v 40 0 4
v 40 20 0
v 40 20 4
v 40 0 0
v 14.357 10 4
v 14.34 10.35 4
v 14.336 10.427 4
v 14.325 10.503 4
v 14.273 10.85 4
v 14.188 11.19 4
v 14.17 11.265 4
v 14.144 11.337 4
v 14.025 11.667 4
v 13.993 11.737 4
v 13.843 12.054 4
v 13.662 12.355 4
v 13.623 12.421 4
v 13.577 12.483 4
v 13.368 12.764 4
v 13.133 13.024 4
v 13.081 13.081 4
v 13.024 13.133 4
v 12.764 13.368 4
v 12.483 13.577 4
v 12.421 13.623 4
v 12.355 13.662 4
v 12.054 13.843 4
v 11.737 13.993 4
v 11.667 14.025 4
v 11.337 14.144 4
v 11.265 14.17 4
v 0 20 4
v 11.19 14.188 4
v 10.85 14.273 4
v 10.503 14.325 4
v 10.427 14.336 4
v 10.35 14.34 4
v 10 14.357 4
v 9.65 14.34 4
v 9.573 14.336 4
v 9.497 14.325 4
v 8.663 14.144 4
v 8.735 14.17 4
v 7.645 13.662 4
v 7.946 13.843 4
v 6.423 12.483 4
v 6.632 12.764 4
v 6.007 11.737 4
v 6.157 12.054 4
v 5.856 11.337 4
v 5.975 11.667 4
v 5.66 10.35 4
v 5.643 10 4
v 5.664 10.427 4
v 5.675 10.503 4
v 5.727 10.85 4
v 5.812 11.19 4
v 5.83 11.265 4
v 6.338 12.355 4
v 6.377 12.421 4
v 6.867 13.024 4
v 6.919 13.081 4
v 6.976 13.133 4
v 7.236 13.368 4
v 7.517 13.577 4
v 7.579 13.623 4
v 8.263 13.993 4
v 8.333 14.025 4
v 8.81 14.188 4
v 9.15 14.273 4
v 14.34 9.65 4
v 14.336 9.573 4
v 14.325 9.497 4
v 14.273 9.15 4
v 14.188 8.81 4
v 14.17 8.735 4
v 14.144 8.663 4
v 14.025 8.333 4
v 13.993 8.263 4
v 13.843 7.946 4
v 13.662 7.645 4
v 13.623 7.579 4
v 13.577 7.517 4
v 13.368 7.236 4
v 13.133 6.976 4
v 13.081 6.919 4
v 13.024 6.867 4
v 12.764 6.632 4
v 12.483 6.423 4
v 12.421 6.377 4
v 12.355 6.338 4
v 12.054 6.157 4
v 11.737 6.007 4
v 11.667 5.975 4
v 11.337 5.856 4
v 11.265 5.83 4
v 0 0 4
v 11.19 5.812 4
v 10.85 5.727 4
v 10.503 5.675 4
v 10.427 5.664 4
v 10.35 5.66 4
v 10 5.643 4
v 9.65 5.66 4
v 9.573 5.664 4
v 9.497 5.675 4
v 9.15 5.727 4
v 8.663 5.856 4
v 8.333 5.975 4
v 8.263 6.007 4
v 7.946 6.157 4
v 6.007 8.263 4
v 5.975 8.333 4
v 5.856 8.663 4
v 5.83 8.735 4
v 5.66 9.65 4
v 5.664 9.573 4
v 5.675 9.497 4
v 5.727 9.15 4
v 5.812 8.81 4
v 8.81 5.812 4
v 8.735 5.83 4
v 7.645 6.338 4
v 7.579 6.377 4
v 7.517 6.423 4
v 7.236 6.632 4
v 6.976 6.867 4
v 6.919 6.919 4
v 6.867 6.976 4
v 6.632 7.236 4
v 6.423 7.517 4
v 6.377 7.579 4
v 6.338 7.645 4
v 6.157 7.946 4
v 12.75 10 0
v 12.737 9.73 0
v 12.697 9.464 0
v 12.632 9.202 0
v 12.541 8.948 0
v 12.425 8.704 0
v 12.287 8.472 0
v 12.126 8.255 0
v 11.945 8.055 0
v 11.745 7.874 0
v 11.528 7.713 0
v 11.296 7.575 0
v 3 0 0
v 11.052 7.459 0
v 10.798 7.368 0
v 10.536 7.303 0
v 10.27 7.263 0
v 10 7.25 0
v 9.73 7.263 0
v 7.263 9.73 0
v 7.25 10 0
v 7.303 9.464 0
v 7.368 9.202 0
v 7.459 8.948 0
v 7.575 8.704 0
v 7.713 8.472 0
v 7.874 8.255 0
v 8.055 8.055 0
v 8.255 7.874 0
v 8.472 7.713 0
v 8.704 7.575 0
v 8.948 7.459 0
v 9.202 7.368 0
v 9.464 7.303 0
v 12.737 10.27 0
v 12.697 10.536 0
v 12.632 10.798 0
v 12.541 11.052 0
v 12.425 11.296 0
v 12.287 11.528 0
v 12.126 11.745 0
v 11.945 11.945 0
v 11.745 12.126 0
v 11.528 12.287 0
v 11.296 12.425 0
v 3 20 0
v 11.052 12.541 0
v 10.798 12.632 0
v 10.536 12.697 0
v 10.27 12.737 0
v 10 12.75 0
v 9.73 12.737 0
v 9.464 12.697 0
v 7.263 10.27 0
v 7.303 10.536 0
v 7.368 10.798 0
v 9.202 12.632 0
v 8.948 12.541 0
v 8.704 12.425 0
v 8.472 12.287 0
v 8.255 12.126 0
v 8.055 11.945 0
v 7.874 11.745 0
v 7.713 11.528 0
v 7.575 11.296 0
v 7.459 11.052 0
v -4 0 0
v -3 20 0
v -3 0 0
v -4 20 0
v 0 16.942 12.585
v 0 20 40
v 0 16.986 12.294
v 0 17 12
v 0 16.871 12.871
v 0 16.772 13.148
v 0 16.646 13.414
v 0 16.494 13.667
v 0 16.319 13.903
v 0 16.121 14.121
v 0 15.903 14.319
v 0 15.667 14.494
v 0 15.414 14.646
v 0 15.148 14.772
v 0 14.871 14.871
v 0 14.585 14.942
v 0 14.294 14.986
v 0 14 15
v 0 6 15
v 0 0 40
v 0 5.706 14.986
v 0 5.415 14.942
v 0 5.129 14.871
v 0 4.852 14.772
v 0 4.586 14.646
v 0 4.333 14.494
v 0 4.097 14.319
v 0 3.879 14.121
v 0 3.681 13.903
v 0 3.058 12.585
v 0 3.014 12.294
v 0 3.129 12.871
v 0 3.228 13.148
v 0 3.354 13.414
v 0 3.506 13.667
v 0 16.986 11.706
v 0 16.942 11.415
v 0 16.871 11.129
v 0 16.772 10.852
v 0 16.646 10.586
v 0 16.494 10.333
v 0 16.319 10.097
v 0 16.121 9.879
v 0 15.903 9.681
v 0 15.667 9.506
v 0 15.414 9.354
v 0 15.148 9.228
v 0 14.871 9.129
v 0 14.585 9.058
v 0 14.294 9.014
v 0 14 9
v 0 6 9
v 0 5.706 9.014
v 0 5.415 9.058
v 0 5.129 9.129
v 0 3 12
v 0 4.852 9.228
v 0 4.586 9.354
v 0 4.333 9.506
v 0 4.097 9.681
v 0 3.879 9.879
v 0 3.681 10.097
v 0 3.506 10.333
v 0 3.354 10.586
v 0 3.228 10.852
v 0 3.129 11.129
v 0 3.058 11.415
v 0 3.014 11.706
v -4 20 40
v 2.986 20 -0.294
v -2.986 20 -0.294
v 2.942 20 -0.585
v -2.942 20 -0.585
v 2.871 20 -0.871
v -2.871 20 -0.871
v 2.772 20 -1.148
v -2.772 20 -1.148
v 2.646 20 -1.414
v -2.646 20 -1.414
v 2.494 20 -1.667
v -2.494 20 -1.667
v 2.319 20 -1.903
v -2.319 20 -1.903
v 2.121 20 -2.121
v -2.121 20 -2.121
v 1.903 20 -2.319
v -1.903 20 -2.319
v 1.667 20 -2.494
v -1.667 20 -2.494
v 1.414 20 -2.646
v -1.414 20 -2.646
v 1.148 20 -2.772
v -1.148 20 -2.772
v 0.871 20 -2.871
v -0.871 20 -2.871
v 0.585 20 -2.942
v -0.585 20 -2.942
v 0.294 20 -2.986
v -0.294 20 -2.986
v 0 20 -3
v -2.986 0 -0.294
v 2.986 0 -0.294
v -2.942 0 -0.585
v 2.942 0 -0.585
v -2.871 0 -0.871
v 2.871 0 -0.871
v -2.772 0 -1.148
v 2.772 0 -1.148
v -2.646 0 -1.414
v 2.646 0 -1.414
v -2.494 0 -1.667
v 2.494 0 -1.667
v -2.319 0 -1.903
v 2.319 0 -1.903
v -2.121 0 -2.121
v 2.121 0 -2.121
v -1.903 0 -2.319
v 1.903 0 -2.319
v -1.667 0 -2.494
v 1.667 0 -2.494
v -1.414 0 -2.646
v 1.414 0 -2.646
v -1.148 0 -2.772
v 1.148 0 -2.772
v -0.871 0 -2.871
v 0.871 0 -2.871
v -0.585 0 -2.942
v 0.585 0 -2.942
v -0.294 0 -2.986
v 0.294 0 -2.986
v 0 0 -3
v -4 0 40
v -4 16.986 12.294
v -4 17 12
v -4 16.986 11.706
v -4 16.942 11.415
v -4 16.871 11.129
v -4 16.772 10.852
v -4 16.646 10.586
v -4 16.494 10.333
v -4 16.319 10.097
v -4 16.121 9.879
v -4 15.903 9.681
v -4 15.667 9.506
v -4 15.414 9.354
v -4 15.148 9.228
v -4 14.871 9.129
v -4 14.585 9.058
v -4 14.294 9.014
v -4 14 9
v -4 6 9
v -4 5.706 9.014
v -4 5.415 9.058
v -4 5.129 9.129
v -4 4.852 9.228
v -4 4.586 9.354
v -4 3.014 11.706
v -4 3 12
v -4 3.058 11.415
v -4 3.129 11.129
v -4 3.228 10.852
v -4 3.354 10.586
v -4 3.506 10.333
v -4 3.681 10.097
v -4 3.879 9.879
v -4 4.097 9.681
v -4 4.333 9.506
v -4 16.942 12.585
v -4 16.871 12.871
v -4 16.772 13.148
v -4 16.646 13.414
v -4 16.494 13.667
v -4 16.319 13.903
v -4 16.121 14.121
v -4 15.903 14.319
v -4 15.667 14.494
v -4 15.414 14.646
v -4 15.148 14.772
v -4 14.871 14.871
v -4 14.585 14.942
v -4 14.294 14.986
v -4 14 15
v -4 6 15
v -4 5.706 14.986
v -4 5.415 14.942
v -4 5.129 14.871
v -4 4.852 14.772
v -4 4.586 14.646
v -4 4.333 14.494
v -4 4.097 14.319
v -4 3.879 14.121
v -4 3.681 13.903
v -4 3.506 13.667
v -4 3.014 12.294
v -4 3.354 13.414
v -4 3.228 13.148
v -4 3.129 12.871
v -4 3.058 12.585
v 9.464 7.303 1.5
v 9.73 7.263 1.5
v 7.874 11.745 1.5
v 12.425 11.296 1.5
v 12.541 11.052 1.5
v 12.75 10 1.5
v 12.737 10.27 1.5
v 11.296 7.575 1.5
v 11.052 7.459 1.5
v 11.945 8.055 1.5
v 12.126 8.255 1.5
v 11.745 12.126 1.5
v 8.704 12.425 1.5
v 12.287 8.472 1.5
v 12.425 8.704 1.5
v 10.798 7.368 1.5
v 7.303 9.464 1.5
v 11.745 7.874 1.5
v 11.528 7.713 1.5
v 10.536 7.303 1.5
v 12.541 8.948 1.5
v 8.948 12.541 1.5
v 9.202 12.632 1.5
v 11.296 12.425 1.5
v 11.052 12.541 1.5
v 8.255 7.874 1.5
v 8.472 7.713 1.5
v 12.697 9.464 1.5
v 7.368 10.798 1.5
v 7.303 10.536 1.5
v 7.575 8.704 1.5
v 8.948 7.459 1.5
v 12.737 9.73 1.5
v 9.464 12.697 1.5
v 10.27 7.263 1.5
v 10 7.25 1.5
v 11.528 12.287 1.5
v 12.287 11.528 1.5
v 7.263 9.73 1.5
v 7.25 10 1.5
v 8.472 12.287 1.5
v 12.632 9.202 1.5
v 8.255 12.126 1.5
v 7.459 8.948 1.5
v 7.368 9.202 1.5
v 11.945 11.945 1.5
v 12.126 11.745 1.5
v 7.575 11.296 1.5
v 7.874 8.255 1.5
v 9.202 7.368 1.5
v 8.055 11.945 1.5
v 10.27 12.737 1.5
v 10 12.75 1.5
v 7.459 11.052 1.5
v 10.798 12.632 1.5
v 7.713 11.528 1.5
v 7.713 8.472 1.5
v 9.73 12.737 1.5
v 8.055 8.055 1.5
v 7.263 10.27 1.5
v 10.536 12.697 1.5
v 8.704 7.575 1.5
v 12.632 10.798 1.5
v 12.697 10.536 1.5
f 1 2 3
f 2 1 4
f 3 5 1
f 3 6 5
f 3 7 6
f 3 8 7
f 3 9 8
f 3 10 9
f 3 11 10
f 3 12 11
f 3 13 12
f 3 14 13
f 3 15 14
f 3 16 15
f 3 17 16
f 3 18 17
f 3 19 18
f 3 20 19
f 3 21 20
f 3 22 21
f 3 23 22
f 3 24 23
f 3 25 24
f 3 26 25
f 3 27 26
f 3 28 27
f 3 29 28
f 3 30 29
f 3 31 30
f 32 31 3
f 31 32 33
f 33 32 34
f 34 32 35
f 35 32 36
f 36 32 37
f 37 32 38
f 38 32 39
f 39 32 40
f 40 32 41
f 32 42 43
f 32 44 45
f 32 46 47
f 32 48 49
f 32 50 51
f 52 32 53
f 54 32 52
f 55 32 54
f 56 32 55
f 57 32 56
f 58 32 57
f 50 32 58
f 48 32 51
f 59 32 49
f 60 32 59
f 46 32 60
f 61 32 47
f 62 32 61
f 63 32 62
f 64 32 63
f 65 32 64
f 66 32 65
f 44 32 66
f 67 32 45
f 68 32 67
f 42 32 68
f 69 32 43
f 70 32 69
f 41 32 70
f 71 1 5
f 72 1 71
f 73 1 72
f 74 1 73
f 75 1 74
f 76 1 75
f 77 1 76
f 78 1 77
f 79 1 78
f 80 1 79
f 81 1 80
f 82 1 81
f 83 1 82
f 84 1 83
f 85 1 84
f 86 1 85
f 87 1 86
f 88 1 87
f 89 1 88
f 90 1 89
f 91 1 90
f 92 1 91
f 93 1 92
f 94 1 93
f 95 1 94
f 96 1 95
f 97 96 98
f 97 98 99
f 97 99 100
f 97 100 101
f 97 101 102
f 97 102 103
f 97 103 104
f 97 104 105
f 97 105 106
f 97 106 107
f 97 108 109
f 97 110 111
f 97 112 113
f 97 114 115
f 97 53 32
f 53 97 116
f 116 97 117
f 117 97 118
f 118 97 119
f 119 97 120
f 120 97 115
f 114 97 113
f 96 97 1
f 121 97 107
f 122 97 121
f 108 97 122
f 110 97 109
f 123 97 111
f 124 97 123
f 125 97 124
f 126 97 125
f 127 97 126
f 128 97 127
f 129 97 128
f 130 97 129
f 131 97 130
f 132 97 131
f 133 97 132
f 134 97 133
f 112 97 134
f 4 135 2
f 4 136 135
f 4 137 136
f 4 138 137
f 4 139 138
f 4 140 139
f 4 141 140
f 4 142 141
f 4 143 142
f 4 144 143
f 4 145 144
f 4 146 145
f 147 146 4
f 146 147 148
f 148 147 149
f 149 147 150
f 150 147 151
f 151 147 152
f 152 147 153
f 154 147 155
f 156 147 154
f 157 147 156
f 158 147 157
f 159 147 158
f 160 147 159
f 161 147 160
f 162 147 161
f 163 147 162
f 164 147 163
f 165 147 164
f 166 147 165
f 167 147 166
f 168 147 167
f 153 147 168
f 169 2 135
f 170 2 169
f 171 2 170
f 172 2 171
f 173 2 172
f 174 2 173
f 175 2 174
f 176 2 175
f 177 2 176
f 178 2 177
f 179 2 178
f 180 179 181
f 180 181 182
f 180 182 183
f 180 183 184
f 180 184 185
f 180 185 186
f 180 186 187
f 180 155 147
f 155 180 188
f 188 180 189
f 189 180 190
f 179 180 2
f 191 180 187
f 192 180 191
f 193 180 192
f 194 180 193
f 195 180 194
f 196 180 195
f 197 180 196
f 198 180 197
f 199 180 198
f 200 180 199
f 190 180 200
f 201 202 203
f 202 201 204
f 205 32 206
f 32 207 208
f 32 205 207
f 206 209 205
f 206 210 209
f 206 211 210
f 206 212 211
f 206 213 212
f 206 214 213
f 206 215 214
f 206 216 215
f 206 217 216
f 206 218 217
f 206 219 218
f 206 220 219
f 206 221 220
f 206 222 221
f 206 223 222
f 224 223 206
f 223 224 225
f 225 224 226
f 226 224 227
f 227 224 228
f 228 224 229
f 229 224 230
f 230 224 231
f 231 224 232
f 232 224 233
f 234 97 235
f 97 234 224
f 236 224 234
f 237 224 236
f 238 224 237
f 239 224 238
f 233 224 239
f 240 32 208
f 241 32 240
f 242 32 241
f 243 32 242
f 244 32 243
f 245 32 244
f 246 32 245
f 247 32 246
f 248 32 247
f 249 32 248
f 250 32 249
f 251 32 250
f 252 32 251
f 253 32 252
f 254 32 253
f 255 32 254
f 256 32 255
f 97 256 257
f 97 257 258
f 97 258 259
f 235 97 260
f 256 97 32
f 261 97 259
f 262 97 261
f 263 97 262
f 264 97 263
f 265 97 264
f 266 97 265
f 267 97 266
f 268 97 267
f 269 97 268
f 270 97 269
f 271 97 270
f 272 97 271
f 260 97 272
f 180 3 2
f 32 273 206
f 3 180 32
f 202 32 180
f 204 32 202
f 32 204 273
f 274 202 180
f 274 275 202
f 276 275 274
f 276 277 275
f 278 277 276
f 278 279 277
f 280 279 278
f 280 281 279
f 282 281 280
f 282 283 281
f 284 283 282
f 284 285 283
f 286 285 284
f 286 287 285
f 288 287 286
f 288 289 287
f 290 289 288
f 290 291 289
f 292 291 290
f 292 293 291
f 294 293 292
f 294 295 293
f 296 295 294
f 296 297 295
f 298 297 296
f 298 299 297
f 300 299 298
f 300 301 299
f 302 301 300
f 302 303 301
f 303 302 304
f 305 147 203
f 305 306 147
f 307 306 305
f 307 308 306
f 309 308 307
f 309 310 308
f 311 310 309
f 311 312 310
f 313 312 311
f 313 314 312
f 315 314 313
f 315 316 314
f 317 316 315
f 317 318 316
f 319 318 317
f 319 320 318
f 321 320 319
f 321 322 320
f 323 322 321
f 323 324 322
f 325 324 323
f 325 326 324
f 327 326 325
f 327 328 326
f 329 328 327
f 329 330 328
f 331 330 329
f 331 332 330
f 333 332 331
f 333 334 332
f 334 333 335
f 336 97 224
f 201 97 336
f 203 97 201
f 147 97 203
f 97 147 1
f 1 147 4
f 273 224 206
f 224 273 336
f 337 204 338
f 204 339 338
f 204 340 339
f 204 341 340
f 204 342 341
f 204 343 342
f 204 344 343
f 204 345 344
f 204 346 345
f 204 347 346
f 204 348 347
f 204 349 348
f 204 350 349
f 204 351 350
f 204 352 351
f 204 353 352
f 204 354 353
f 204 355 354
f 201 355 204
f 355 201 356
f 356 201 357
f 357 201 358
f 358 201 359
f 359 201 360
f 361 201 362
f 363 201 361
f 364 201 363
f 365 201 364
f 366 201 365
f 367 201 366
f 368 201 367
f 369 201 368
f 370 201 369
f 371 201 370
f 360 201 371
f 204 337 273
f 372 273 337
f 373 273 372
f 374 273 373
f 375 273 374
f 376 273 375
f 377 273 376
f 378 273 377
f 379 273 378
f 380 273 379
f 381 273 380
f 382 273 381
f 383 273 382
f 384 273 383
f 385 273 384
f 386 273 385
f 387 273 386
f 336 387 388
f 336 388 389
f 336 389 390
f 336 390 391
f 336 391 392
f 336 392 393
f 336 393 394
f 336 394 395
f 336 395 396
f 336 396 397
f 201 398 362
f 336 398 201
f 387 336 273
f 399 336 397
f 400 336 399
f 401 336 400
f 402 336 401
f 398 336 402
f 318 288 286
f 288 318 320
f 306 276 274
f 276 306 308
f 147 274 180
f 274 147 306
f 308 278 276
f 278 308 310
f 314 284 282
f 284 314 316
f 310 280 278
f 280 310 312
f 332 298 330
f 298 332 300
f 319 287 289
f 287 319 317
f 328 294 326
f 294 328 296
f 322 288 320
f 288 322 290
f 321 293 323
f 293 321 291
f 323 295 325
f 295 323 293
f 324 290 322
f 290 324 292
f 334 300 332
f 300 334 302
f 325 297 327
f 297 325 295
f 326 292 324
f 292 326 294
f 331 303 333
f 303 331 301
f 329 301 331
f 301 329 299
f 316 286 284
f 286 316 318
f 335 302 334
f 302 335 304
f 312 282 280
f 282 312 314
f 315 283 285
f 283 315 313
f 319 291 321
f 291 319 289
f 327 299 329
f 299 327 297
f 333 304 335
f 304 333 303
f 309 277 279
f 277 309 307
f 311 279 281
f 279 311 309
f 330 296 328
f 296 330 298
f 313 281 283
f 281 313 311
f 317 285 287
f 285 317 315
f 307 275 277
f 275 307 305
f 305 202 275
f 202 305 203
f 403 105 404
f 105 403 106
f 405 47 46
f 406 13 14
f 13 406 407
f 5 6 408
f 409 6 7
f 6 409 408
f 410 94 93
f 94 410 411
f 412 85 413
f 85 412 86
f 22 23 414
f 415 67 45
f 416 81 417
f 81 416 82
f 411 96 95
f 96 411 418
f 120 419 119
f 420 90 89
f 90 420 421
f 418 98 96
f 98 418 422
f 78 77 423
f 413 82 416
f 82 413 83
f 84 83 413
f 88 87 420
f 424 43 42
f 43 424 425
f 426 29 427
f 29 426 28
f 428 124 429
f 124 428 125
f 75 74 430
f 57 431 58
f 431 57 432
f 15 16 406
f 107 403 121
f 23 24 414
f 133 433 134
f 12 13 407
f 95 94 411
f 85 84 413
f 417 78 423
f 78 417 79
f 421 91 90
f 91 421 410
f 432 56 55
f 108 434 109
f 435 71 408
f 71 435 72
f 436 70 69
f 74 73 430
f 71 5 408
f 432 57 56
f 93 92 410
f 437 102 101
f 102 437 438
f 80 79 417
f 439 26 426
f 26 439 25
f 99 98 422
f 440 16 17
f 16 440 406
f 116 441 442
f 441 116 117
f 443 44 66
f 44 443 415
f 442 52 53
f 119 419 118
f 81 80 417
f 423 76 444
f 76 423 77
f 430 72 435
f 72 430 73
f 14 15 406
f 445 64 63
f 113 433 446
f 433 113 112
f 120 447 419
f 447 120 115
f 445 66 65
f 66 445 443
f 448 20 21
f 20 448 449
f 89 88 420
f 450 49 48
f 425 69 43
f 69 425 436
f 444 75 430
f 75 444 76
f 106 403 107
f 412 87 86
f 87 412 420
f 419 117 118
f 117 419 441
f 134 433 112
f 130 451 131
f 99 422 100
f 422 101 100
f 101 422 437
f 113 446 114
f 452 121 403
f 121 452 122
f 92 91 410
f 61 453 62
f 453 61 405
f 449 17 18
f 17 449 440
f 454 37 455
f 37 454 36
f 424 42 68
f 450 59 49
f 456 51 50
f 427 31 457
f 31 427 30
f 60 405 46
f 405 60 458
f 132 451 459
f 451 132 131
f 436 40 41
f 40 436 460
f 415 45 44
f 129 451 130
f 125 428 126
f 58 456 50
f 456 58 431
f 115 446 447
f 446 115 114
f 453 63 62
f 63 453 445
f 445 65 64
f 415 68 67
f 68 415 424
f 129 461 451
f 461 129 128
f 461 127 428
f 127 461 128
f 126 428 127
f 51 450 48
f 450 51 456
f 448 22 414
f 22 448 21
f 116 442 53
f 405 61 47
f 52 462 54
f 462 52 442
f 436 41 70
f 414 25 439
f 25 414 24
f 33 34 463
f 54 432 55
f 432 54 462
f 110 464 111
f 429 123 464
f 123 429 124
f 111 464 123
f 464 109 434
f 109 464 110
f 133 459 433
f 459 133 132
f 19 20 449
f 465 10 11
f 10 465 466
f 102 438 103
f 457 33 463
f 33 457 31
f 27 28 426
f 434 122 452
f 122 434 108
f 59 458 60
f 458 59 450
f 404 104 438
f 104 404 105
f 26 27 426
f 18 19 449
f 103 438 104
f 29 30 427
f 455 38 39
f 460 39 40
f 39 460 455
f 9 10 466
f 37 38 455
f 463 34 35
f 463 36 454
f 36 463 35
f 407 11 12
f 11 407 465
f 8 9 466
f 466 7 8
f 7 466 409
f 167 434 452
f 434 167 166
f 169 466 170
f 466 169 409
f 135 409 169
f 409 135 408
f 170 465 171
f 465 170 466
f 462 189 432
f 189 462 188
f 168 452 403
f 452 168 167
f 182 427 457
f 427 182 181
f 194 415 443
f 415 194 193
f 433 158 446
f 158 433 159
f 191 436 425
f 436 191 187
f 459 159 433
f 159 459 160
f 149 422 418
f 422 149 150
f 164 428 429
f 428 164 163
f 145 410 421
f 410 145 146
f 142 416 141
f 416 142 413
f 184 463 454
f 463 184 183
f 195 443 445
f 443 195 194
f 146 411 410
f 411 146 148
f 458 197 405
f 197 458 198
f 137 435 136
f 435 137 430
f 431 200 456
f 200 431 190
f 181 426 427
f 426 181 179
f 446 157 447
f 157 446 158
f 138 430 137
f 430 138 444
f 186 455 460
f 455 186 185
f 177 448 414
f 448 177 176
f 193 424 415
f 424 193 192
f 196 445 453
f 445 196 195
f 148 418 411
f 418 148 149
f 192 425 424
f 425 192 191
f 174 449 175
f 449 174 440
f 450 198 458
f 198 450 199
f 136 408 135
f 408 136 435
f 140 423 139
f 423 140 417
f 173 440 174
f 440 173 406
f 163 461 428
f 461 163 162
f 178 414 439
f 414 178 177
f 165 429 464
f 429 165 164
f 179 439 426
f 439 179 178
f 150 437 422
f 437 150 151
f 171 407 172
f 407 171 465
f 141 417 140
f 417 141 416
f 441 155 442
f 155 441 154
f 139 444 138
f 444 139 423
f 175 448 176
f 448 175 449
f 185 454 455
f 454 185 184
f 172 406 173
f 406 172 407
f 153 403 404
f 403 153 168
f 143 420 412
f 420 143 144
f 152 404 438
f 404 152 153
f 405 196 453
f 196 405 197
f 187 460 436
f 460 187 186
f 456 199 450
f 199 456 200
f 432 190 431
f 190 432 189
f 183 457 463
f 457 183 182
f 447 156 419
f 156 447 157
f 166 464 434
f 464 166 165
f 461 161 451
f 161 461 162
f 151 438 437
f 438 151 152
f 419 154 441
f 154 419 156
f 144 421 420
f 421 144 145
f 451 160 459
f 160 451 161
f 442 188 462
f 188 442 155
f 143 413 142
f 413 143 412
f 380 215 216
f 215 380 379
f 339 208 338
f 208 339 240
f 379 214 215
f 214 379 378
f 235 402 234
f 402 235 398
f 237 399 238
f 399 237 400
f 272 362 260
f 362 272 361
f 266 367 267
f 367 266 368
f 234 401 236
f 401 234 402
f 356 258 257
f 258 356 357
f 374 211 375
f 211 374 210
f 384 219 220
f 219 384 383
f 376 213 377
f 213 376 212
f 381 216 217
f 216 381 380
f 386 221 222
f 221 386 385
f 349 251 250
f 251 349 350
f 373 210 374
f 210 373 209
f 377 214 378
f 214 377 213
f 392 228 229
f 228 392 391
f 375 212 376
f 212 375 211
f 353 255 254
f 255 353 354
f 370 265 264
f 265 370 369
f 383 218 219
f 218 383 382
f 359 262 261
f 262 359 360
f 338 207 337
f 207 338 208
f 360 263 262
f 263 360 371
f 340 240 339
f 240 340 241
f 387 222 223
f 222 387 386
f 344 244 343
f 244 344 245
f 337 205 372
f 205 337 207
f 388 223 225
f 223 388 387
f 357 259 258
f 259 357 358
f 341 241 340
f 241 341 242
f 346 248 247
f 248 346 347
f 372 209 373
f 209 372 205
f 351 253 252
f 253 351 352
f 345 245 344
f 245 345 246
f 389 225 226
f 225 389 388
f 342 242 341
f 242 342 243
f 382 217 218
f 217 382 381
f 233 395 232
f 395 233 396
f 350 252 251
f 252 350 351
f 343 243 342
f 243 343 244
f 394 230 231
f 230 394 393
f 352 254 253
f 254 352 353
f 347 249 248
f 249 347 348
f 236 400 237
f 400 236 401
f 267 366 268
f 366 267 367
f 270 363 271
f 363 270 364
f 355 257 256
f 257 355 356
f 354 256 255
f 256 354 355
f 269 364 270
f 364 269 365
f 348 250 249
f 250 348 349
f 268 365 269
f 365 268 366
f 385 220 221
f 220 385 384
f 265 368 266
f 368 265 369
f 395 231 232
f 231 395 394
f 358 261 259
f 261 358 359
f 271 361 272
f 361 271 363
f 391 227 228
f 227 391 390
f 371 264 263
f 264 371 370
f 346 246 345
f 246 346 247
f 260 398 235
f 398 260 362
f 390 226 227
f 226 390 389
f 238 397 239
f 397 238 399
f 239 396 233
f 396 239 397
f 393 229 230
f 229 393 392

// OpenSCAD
// l-bracket.scad — parametric L-shaped angle bracket.
//
// Two flat faces at 90 degrees. Face A carries an optional countersunk
// hex-bolt hole (set hole_diameter=0 to omit it entirely — some real
// brackets, like the small clip measured in
// projects/furniture-brackets/measurements.yaml, only have the slot);
// Face B carries an oblong adjustment slot. Modeled after the corner-bracket
// shape described in ../../../projects/furniture-brackets/NOTES.md.
//
// All parameters are overridden from the command line via `-D name=value`
// by pipeline/bracket-gen/src/render.js — do not hand-edit the defaults
// below for a real part, override them instead so the template stays
// reusable for the next bracket (per ROADMAP.md Milestone 1's "feed
// numbers, get an STL" goal).

// --- Parameters (defaults are a plausible small bracket, not a real part) ---
face_a_length   = 40;   // mm, length of the first flat face
face_b_length   = 40;   // mm, length of the second flat face
width           = 20;   // mm, bracket width (constant along both faces)
thickness       = 4;    // mm, material thickness (already PLA-bumped by the caller)
bend_radius     = 3;    // mm, inner fillet radius at the 90-degree bend

hole_diameter        = 5.5; // mm, hex-bolt clearance hole on Face A
countersink_diameter = 10;  // mm, countersink diameter on Face A
countersink_depth    = 2.5; // mm, countersink depth
hole_offset          = 10;  // mm, hole center distance from the bend, along Face A

slot_length = 14;  // mm, oblong adjustment slot length on Face B
slot_width  = 6;   // mm, oblong adjustment slot width
slot_offset = 12;  // mm, slot center distance from the bend, along Face B

$fn = 64; // smooth enough for functional PLA/PETG prints, not a display model

module l_bracket() {
  difference() {
    union() {
      // Face A: lies flat along X, thickness rises in Z
      translate([0, 0, 0])
        cube([face_a_length, width, thickness]);

      // Face B: rotated up 90 degrees from the shared bend edge at x=0
      translate([0, 0, 0])
        rotate([0, -90, 0])
          cube([face_b_length, width, thickness]);

      // Inner fillet at the bend, so the corner isn't a stress-concentrating
      // sharp inside edge (README's "add a fillet at the bend" note).
      translate([0, 0, 0])
        rotate([-90, 0, 0])
          cylinder(h = width, r = bend_radius);
    }

    // Hex-bolt hole + countersink, centered on Face A — omitted entirely
    // when hole_diameter <= 0 (avoids a degenerate zero-radius cylinder,
    // and some real brackets simply don't have this feature).
    if (hole_diameter > 0) {
      translate([hole_offset, width / 2, thickness - countersink_depth])
        cylinder(h = countersink_depth + 1, d1 = hole_diameter, d2 = countersink_diameter);
      translate([hole_offset, width / 2, -1])
        cylinder(h = thickness + 2, d = hole_diameter);
    }

    // Oblong adjustment slot on Face B (cut along the face's long axis)
    translate([-thickness - 1, width / 2, slot_offset])
      rotate([0, 90, 0])
        hull() {
          translate([0, -(slot_length - slot_width) / 2, 0])
            cylinder(h = thickness + 2, d = slot_width);
          translate([0, (slot_length - slot_width) / 2, 0])
            cylinder(h = thickness + 2, d = slot_width);
        }
  }
}

l_bracket();
